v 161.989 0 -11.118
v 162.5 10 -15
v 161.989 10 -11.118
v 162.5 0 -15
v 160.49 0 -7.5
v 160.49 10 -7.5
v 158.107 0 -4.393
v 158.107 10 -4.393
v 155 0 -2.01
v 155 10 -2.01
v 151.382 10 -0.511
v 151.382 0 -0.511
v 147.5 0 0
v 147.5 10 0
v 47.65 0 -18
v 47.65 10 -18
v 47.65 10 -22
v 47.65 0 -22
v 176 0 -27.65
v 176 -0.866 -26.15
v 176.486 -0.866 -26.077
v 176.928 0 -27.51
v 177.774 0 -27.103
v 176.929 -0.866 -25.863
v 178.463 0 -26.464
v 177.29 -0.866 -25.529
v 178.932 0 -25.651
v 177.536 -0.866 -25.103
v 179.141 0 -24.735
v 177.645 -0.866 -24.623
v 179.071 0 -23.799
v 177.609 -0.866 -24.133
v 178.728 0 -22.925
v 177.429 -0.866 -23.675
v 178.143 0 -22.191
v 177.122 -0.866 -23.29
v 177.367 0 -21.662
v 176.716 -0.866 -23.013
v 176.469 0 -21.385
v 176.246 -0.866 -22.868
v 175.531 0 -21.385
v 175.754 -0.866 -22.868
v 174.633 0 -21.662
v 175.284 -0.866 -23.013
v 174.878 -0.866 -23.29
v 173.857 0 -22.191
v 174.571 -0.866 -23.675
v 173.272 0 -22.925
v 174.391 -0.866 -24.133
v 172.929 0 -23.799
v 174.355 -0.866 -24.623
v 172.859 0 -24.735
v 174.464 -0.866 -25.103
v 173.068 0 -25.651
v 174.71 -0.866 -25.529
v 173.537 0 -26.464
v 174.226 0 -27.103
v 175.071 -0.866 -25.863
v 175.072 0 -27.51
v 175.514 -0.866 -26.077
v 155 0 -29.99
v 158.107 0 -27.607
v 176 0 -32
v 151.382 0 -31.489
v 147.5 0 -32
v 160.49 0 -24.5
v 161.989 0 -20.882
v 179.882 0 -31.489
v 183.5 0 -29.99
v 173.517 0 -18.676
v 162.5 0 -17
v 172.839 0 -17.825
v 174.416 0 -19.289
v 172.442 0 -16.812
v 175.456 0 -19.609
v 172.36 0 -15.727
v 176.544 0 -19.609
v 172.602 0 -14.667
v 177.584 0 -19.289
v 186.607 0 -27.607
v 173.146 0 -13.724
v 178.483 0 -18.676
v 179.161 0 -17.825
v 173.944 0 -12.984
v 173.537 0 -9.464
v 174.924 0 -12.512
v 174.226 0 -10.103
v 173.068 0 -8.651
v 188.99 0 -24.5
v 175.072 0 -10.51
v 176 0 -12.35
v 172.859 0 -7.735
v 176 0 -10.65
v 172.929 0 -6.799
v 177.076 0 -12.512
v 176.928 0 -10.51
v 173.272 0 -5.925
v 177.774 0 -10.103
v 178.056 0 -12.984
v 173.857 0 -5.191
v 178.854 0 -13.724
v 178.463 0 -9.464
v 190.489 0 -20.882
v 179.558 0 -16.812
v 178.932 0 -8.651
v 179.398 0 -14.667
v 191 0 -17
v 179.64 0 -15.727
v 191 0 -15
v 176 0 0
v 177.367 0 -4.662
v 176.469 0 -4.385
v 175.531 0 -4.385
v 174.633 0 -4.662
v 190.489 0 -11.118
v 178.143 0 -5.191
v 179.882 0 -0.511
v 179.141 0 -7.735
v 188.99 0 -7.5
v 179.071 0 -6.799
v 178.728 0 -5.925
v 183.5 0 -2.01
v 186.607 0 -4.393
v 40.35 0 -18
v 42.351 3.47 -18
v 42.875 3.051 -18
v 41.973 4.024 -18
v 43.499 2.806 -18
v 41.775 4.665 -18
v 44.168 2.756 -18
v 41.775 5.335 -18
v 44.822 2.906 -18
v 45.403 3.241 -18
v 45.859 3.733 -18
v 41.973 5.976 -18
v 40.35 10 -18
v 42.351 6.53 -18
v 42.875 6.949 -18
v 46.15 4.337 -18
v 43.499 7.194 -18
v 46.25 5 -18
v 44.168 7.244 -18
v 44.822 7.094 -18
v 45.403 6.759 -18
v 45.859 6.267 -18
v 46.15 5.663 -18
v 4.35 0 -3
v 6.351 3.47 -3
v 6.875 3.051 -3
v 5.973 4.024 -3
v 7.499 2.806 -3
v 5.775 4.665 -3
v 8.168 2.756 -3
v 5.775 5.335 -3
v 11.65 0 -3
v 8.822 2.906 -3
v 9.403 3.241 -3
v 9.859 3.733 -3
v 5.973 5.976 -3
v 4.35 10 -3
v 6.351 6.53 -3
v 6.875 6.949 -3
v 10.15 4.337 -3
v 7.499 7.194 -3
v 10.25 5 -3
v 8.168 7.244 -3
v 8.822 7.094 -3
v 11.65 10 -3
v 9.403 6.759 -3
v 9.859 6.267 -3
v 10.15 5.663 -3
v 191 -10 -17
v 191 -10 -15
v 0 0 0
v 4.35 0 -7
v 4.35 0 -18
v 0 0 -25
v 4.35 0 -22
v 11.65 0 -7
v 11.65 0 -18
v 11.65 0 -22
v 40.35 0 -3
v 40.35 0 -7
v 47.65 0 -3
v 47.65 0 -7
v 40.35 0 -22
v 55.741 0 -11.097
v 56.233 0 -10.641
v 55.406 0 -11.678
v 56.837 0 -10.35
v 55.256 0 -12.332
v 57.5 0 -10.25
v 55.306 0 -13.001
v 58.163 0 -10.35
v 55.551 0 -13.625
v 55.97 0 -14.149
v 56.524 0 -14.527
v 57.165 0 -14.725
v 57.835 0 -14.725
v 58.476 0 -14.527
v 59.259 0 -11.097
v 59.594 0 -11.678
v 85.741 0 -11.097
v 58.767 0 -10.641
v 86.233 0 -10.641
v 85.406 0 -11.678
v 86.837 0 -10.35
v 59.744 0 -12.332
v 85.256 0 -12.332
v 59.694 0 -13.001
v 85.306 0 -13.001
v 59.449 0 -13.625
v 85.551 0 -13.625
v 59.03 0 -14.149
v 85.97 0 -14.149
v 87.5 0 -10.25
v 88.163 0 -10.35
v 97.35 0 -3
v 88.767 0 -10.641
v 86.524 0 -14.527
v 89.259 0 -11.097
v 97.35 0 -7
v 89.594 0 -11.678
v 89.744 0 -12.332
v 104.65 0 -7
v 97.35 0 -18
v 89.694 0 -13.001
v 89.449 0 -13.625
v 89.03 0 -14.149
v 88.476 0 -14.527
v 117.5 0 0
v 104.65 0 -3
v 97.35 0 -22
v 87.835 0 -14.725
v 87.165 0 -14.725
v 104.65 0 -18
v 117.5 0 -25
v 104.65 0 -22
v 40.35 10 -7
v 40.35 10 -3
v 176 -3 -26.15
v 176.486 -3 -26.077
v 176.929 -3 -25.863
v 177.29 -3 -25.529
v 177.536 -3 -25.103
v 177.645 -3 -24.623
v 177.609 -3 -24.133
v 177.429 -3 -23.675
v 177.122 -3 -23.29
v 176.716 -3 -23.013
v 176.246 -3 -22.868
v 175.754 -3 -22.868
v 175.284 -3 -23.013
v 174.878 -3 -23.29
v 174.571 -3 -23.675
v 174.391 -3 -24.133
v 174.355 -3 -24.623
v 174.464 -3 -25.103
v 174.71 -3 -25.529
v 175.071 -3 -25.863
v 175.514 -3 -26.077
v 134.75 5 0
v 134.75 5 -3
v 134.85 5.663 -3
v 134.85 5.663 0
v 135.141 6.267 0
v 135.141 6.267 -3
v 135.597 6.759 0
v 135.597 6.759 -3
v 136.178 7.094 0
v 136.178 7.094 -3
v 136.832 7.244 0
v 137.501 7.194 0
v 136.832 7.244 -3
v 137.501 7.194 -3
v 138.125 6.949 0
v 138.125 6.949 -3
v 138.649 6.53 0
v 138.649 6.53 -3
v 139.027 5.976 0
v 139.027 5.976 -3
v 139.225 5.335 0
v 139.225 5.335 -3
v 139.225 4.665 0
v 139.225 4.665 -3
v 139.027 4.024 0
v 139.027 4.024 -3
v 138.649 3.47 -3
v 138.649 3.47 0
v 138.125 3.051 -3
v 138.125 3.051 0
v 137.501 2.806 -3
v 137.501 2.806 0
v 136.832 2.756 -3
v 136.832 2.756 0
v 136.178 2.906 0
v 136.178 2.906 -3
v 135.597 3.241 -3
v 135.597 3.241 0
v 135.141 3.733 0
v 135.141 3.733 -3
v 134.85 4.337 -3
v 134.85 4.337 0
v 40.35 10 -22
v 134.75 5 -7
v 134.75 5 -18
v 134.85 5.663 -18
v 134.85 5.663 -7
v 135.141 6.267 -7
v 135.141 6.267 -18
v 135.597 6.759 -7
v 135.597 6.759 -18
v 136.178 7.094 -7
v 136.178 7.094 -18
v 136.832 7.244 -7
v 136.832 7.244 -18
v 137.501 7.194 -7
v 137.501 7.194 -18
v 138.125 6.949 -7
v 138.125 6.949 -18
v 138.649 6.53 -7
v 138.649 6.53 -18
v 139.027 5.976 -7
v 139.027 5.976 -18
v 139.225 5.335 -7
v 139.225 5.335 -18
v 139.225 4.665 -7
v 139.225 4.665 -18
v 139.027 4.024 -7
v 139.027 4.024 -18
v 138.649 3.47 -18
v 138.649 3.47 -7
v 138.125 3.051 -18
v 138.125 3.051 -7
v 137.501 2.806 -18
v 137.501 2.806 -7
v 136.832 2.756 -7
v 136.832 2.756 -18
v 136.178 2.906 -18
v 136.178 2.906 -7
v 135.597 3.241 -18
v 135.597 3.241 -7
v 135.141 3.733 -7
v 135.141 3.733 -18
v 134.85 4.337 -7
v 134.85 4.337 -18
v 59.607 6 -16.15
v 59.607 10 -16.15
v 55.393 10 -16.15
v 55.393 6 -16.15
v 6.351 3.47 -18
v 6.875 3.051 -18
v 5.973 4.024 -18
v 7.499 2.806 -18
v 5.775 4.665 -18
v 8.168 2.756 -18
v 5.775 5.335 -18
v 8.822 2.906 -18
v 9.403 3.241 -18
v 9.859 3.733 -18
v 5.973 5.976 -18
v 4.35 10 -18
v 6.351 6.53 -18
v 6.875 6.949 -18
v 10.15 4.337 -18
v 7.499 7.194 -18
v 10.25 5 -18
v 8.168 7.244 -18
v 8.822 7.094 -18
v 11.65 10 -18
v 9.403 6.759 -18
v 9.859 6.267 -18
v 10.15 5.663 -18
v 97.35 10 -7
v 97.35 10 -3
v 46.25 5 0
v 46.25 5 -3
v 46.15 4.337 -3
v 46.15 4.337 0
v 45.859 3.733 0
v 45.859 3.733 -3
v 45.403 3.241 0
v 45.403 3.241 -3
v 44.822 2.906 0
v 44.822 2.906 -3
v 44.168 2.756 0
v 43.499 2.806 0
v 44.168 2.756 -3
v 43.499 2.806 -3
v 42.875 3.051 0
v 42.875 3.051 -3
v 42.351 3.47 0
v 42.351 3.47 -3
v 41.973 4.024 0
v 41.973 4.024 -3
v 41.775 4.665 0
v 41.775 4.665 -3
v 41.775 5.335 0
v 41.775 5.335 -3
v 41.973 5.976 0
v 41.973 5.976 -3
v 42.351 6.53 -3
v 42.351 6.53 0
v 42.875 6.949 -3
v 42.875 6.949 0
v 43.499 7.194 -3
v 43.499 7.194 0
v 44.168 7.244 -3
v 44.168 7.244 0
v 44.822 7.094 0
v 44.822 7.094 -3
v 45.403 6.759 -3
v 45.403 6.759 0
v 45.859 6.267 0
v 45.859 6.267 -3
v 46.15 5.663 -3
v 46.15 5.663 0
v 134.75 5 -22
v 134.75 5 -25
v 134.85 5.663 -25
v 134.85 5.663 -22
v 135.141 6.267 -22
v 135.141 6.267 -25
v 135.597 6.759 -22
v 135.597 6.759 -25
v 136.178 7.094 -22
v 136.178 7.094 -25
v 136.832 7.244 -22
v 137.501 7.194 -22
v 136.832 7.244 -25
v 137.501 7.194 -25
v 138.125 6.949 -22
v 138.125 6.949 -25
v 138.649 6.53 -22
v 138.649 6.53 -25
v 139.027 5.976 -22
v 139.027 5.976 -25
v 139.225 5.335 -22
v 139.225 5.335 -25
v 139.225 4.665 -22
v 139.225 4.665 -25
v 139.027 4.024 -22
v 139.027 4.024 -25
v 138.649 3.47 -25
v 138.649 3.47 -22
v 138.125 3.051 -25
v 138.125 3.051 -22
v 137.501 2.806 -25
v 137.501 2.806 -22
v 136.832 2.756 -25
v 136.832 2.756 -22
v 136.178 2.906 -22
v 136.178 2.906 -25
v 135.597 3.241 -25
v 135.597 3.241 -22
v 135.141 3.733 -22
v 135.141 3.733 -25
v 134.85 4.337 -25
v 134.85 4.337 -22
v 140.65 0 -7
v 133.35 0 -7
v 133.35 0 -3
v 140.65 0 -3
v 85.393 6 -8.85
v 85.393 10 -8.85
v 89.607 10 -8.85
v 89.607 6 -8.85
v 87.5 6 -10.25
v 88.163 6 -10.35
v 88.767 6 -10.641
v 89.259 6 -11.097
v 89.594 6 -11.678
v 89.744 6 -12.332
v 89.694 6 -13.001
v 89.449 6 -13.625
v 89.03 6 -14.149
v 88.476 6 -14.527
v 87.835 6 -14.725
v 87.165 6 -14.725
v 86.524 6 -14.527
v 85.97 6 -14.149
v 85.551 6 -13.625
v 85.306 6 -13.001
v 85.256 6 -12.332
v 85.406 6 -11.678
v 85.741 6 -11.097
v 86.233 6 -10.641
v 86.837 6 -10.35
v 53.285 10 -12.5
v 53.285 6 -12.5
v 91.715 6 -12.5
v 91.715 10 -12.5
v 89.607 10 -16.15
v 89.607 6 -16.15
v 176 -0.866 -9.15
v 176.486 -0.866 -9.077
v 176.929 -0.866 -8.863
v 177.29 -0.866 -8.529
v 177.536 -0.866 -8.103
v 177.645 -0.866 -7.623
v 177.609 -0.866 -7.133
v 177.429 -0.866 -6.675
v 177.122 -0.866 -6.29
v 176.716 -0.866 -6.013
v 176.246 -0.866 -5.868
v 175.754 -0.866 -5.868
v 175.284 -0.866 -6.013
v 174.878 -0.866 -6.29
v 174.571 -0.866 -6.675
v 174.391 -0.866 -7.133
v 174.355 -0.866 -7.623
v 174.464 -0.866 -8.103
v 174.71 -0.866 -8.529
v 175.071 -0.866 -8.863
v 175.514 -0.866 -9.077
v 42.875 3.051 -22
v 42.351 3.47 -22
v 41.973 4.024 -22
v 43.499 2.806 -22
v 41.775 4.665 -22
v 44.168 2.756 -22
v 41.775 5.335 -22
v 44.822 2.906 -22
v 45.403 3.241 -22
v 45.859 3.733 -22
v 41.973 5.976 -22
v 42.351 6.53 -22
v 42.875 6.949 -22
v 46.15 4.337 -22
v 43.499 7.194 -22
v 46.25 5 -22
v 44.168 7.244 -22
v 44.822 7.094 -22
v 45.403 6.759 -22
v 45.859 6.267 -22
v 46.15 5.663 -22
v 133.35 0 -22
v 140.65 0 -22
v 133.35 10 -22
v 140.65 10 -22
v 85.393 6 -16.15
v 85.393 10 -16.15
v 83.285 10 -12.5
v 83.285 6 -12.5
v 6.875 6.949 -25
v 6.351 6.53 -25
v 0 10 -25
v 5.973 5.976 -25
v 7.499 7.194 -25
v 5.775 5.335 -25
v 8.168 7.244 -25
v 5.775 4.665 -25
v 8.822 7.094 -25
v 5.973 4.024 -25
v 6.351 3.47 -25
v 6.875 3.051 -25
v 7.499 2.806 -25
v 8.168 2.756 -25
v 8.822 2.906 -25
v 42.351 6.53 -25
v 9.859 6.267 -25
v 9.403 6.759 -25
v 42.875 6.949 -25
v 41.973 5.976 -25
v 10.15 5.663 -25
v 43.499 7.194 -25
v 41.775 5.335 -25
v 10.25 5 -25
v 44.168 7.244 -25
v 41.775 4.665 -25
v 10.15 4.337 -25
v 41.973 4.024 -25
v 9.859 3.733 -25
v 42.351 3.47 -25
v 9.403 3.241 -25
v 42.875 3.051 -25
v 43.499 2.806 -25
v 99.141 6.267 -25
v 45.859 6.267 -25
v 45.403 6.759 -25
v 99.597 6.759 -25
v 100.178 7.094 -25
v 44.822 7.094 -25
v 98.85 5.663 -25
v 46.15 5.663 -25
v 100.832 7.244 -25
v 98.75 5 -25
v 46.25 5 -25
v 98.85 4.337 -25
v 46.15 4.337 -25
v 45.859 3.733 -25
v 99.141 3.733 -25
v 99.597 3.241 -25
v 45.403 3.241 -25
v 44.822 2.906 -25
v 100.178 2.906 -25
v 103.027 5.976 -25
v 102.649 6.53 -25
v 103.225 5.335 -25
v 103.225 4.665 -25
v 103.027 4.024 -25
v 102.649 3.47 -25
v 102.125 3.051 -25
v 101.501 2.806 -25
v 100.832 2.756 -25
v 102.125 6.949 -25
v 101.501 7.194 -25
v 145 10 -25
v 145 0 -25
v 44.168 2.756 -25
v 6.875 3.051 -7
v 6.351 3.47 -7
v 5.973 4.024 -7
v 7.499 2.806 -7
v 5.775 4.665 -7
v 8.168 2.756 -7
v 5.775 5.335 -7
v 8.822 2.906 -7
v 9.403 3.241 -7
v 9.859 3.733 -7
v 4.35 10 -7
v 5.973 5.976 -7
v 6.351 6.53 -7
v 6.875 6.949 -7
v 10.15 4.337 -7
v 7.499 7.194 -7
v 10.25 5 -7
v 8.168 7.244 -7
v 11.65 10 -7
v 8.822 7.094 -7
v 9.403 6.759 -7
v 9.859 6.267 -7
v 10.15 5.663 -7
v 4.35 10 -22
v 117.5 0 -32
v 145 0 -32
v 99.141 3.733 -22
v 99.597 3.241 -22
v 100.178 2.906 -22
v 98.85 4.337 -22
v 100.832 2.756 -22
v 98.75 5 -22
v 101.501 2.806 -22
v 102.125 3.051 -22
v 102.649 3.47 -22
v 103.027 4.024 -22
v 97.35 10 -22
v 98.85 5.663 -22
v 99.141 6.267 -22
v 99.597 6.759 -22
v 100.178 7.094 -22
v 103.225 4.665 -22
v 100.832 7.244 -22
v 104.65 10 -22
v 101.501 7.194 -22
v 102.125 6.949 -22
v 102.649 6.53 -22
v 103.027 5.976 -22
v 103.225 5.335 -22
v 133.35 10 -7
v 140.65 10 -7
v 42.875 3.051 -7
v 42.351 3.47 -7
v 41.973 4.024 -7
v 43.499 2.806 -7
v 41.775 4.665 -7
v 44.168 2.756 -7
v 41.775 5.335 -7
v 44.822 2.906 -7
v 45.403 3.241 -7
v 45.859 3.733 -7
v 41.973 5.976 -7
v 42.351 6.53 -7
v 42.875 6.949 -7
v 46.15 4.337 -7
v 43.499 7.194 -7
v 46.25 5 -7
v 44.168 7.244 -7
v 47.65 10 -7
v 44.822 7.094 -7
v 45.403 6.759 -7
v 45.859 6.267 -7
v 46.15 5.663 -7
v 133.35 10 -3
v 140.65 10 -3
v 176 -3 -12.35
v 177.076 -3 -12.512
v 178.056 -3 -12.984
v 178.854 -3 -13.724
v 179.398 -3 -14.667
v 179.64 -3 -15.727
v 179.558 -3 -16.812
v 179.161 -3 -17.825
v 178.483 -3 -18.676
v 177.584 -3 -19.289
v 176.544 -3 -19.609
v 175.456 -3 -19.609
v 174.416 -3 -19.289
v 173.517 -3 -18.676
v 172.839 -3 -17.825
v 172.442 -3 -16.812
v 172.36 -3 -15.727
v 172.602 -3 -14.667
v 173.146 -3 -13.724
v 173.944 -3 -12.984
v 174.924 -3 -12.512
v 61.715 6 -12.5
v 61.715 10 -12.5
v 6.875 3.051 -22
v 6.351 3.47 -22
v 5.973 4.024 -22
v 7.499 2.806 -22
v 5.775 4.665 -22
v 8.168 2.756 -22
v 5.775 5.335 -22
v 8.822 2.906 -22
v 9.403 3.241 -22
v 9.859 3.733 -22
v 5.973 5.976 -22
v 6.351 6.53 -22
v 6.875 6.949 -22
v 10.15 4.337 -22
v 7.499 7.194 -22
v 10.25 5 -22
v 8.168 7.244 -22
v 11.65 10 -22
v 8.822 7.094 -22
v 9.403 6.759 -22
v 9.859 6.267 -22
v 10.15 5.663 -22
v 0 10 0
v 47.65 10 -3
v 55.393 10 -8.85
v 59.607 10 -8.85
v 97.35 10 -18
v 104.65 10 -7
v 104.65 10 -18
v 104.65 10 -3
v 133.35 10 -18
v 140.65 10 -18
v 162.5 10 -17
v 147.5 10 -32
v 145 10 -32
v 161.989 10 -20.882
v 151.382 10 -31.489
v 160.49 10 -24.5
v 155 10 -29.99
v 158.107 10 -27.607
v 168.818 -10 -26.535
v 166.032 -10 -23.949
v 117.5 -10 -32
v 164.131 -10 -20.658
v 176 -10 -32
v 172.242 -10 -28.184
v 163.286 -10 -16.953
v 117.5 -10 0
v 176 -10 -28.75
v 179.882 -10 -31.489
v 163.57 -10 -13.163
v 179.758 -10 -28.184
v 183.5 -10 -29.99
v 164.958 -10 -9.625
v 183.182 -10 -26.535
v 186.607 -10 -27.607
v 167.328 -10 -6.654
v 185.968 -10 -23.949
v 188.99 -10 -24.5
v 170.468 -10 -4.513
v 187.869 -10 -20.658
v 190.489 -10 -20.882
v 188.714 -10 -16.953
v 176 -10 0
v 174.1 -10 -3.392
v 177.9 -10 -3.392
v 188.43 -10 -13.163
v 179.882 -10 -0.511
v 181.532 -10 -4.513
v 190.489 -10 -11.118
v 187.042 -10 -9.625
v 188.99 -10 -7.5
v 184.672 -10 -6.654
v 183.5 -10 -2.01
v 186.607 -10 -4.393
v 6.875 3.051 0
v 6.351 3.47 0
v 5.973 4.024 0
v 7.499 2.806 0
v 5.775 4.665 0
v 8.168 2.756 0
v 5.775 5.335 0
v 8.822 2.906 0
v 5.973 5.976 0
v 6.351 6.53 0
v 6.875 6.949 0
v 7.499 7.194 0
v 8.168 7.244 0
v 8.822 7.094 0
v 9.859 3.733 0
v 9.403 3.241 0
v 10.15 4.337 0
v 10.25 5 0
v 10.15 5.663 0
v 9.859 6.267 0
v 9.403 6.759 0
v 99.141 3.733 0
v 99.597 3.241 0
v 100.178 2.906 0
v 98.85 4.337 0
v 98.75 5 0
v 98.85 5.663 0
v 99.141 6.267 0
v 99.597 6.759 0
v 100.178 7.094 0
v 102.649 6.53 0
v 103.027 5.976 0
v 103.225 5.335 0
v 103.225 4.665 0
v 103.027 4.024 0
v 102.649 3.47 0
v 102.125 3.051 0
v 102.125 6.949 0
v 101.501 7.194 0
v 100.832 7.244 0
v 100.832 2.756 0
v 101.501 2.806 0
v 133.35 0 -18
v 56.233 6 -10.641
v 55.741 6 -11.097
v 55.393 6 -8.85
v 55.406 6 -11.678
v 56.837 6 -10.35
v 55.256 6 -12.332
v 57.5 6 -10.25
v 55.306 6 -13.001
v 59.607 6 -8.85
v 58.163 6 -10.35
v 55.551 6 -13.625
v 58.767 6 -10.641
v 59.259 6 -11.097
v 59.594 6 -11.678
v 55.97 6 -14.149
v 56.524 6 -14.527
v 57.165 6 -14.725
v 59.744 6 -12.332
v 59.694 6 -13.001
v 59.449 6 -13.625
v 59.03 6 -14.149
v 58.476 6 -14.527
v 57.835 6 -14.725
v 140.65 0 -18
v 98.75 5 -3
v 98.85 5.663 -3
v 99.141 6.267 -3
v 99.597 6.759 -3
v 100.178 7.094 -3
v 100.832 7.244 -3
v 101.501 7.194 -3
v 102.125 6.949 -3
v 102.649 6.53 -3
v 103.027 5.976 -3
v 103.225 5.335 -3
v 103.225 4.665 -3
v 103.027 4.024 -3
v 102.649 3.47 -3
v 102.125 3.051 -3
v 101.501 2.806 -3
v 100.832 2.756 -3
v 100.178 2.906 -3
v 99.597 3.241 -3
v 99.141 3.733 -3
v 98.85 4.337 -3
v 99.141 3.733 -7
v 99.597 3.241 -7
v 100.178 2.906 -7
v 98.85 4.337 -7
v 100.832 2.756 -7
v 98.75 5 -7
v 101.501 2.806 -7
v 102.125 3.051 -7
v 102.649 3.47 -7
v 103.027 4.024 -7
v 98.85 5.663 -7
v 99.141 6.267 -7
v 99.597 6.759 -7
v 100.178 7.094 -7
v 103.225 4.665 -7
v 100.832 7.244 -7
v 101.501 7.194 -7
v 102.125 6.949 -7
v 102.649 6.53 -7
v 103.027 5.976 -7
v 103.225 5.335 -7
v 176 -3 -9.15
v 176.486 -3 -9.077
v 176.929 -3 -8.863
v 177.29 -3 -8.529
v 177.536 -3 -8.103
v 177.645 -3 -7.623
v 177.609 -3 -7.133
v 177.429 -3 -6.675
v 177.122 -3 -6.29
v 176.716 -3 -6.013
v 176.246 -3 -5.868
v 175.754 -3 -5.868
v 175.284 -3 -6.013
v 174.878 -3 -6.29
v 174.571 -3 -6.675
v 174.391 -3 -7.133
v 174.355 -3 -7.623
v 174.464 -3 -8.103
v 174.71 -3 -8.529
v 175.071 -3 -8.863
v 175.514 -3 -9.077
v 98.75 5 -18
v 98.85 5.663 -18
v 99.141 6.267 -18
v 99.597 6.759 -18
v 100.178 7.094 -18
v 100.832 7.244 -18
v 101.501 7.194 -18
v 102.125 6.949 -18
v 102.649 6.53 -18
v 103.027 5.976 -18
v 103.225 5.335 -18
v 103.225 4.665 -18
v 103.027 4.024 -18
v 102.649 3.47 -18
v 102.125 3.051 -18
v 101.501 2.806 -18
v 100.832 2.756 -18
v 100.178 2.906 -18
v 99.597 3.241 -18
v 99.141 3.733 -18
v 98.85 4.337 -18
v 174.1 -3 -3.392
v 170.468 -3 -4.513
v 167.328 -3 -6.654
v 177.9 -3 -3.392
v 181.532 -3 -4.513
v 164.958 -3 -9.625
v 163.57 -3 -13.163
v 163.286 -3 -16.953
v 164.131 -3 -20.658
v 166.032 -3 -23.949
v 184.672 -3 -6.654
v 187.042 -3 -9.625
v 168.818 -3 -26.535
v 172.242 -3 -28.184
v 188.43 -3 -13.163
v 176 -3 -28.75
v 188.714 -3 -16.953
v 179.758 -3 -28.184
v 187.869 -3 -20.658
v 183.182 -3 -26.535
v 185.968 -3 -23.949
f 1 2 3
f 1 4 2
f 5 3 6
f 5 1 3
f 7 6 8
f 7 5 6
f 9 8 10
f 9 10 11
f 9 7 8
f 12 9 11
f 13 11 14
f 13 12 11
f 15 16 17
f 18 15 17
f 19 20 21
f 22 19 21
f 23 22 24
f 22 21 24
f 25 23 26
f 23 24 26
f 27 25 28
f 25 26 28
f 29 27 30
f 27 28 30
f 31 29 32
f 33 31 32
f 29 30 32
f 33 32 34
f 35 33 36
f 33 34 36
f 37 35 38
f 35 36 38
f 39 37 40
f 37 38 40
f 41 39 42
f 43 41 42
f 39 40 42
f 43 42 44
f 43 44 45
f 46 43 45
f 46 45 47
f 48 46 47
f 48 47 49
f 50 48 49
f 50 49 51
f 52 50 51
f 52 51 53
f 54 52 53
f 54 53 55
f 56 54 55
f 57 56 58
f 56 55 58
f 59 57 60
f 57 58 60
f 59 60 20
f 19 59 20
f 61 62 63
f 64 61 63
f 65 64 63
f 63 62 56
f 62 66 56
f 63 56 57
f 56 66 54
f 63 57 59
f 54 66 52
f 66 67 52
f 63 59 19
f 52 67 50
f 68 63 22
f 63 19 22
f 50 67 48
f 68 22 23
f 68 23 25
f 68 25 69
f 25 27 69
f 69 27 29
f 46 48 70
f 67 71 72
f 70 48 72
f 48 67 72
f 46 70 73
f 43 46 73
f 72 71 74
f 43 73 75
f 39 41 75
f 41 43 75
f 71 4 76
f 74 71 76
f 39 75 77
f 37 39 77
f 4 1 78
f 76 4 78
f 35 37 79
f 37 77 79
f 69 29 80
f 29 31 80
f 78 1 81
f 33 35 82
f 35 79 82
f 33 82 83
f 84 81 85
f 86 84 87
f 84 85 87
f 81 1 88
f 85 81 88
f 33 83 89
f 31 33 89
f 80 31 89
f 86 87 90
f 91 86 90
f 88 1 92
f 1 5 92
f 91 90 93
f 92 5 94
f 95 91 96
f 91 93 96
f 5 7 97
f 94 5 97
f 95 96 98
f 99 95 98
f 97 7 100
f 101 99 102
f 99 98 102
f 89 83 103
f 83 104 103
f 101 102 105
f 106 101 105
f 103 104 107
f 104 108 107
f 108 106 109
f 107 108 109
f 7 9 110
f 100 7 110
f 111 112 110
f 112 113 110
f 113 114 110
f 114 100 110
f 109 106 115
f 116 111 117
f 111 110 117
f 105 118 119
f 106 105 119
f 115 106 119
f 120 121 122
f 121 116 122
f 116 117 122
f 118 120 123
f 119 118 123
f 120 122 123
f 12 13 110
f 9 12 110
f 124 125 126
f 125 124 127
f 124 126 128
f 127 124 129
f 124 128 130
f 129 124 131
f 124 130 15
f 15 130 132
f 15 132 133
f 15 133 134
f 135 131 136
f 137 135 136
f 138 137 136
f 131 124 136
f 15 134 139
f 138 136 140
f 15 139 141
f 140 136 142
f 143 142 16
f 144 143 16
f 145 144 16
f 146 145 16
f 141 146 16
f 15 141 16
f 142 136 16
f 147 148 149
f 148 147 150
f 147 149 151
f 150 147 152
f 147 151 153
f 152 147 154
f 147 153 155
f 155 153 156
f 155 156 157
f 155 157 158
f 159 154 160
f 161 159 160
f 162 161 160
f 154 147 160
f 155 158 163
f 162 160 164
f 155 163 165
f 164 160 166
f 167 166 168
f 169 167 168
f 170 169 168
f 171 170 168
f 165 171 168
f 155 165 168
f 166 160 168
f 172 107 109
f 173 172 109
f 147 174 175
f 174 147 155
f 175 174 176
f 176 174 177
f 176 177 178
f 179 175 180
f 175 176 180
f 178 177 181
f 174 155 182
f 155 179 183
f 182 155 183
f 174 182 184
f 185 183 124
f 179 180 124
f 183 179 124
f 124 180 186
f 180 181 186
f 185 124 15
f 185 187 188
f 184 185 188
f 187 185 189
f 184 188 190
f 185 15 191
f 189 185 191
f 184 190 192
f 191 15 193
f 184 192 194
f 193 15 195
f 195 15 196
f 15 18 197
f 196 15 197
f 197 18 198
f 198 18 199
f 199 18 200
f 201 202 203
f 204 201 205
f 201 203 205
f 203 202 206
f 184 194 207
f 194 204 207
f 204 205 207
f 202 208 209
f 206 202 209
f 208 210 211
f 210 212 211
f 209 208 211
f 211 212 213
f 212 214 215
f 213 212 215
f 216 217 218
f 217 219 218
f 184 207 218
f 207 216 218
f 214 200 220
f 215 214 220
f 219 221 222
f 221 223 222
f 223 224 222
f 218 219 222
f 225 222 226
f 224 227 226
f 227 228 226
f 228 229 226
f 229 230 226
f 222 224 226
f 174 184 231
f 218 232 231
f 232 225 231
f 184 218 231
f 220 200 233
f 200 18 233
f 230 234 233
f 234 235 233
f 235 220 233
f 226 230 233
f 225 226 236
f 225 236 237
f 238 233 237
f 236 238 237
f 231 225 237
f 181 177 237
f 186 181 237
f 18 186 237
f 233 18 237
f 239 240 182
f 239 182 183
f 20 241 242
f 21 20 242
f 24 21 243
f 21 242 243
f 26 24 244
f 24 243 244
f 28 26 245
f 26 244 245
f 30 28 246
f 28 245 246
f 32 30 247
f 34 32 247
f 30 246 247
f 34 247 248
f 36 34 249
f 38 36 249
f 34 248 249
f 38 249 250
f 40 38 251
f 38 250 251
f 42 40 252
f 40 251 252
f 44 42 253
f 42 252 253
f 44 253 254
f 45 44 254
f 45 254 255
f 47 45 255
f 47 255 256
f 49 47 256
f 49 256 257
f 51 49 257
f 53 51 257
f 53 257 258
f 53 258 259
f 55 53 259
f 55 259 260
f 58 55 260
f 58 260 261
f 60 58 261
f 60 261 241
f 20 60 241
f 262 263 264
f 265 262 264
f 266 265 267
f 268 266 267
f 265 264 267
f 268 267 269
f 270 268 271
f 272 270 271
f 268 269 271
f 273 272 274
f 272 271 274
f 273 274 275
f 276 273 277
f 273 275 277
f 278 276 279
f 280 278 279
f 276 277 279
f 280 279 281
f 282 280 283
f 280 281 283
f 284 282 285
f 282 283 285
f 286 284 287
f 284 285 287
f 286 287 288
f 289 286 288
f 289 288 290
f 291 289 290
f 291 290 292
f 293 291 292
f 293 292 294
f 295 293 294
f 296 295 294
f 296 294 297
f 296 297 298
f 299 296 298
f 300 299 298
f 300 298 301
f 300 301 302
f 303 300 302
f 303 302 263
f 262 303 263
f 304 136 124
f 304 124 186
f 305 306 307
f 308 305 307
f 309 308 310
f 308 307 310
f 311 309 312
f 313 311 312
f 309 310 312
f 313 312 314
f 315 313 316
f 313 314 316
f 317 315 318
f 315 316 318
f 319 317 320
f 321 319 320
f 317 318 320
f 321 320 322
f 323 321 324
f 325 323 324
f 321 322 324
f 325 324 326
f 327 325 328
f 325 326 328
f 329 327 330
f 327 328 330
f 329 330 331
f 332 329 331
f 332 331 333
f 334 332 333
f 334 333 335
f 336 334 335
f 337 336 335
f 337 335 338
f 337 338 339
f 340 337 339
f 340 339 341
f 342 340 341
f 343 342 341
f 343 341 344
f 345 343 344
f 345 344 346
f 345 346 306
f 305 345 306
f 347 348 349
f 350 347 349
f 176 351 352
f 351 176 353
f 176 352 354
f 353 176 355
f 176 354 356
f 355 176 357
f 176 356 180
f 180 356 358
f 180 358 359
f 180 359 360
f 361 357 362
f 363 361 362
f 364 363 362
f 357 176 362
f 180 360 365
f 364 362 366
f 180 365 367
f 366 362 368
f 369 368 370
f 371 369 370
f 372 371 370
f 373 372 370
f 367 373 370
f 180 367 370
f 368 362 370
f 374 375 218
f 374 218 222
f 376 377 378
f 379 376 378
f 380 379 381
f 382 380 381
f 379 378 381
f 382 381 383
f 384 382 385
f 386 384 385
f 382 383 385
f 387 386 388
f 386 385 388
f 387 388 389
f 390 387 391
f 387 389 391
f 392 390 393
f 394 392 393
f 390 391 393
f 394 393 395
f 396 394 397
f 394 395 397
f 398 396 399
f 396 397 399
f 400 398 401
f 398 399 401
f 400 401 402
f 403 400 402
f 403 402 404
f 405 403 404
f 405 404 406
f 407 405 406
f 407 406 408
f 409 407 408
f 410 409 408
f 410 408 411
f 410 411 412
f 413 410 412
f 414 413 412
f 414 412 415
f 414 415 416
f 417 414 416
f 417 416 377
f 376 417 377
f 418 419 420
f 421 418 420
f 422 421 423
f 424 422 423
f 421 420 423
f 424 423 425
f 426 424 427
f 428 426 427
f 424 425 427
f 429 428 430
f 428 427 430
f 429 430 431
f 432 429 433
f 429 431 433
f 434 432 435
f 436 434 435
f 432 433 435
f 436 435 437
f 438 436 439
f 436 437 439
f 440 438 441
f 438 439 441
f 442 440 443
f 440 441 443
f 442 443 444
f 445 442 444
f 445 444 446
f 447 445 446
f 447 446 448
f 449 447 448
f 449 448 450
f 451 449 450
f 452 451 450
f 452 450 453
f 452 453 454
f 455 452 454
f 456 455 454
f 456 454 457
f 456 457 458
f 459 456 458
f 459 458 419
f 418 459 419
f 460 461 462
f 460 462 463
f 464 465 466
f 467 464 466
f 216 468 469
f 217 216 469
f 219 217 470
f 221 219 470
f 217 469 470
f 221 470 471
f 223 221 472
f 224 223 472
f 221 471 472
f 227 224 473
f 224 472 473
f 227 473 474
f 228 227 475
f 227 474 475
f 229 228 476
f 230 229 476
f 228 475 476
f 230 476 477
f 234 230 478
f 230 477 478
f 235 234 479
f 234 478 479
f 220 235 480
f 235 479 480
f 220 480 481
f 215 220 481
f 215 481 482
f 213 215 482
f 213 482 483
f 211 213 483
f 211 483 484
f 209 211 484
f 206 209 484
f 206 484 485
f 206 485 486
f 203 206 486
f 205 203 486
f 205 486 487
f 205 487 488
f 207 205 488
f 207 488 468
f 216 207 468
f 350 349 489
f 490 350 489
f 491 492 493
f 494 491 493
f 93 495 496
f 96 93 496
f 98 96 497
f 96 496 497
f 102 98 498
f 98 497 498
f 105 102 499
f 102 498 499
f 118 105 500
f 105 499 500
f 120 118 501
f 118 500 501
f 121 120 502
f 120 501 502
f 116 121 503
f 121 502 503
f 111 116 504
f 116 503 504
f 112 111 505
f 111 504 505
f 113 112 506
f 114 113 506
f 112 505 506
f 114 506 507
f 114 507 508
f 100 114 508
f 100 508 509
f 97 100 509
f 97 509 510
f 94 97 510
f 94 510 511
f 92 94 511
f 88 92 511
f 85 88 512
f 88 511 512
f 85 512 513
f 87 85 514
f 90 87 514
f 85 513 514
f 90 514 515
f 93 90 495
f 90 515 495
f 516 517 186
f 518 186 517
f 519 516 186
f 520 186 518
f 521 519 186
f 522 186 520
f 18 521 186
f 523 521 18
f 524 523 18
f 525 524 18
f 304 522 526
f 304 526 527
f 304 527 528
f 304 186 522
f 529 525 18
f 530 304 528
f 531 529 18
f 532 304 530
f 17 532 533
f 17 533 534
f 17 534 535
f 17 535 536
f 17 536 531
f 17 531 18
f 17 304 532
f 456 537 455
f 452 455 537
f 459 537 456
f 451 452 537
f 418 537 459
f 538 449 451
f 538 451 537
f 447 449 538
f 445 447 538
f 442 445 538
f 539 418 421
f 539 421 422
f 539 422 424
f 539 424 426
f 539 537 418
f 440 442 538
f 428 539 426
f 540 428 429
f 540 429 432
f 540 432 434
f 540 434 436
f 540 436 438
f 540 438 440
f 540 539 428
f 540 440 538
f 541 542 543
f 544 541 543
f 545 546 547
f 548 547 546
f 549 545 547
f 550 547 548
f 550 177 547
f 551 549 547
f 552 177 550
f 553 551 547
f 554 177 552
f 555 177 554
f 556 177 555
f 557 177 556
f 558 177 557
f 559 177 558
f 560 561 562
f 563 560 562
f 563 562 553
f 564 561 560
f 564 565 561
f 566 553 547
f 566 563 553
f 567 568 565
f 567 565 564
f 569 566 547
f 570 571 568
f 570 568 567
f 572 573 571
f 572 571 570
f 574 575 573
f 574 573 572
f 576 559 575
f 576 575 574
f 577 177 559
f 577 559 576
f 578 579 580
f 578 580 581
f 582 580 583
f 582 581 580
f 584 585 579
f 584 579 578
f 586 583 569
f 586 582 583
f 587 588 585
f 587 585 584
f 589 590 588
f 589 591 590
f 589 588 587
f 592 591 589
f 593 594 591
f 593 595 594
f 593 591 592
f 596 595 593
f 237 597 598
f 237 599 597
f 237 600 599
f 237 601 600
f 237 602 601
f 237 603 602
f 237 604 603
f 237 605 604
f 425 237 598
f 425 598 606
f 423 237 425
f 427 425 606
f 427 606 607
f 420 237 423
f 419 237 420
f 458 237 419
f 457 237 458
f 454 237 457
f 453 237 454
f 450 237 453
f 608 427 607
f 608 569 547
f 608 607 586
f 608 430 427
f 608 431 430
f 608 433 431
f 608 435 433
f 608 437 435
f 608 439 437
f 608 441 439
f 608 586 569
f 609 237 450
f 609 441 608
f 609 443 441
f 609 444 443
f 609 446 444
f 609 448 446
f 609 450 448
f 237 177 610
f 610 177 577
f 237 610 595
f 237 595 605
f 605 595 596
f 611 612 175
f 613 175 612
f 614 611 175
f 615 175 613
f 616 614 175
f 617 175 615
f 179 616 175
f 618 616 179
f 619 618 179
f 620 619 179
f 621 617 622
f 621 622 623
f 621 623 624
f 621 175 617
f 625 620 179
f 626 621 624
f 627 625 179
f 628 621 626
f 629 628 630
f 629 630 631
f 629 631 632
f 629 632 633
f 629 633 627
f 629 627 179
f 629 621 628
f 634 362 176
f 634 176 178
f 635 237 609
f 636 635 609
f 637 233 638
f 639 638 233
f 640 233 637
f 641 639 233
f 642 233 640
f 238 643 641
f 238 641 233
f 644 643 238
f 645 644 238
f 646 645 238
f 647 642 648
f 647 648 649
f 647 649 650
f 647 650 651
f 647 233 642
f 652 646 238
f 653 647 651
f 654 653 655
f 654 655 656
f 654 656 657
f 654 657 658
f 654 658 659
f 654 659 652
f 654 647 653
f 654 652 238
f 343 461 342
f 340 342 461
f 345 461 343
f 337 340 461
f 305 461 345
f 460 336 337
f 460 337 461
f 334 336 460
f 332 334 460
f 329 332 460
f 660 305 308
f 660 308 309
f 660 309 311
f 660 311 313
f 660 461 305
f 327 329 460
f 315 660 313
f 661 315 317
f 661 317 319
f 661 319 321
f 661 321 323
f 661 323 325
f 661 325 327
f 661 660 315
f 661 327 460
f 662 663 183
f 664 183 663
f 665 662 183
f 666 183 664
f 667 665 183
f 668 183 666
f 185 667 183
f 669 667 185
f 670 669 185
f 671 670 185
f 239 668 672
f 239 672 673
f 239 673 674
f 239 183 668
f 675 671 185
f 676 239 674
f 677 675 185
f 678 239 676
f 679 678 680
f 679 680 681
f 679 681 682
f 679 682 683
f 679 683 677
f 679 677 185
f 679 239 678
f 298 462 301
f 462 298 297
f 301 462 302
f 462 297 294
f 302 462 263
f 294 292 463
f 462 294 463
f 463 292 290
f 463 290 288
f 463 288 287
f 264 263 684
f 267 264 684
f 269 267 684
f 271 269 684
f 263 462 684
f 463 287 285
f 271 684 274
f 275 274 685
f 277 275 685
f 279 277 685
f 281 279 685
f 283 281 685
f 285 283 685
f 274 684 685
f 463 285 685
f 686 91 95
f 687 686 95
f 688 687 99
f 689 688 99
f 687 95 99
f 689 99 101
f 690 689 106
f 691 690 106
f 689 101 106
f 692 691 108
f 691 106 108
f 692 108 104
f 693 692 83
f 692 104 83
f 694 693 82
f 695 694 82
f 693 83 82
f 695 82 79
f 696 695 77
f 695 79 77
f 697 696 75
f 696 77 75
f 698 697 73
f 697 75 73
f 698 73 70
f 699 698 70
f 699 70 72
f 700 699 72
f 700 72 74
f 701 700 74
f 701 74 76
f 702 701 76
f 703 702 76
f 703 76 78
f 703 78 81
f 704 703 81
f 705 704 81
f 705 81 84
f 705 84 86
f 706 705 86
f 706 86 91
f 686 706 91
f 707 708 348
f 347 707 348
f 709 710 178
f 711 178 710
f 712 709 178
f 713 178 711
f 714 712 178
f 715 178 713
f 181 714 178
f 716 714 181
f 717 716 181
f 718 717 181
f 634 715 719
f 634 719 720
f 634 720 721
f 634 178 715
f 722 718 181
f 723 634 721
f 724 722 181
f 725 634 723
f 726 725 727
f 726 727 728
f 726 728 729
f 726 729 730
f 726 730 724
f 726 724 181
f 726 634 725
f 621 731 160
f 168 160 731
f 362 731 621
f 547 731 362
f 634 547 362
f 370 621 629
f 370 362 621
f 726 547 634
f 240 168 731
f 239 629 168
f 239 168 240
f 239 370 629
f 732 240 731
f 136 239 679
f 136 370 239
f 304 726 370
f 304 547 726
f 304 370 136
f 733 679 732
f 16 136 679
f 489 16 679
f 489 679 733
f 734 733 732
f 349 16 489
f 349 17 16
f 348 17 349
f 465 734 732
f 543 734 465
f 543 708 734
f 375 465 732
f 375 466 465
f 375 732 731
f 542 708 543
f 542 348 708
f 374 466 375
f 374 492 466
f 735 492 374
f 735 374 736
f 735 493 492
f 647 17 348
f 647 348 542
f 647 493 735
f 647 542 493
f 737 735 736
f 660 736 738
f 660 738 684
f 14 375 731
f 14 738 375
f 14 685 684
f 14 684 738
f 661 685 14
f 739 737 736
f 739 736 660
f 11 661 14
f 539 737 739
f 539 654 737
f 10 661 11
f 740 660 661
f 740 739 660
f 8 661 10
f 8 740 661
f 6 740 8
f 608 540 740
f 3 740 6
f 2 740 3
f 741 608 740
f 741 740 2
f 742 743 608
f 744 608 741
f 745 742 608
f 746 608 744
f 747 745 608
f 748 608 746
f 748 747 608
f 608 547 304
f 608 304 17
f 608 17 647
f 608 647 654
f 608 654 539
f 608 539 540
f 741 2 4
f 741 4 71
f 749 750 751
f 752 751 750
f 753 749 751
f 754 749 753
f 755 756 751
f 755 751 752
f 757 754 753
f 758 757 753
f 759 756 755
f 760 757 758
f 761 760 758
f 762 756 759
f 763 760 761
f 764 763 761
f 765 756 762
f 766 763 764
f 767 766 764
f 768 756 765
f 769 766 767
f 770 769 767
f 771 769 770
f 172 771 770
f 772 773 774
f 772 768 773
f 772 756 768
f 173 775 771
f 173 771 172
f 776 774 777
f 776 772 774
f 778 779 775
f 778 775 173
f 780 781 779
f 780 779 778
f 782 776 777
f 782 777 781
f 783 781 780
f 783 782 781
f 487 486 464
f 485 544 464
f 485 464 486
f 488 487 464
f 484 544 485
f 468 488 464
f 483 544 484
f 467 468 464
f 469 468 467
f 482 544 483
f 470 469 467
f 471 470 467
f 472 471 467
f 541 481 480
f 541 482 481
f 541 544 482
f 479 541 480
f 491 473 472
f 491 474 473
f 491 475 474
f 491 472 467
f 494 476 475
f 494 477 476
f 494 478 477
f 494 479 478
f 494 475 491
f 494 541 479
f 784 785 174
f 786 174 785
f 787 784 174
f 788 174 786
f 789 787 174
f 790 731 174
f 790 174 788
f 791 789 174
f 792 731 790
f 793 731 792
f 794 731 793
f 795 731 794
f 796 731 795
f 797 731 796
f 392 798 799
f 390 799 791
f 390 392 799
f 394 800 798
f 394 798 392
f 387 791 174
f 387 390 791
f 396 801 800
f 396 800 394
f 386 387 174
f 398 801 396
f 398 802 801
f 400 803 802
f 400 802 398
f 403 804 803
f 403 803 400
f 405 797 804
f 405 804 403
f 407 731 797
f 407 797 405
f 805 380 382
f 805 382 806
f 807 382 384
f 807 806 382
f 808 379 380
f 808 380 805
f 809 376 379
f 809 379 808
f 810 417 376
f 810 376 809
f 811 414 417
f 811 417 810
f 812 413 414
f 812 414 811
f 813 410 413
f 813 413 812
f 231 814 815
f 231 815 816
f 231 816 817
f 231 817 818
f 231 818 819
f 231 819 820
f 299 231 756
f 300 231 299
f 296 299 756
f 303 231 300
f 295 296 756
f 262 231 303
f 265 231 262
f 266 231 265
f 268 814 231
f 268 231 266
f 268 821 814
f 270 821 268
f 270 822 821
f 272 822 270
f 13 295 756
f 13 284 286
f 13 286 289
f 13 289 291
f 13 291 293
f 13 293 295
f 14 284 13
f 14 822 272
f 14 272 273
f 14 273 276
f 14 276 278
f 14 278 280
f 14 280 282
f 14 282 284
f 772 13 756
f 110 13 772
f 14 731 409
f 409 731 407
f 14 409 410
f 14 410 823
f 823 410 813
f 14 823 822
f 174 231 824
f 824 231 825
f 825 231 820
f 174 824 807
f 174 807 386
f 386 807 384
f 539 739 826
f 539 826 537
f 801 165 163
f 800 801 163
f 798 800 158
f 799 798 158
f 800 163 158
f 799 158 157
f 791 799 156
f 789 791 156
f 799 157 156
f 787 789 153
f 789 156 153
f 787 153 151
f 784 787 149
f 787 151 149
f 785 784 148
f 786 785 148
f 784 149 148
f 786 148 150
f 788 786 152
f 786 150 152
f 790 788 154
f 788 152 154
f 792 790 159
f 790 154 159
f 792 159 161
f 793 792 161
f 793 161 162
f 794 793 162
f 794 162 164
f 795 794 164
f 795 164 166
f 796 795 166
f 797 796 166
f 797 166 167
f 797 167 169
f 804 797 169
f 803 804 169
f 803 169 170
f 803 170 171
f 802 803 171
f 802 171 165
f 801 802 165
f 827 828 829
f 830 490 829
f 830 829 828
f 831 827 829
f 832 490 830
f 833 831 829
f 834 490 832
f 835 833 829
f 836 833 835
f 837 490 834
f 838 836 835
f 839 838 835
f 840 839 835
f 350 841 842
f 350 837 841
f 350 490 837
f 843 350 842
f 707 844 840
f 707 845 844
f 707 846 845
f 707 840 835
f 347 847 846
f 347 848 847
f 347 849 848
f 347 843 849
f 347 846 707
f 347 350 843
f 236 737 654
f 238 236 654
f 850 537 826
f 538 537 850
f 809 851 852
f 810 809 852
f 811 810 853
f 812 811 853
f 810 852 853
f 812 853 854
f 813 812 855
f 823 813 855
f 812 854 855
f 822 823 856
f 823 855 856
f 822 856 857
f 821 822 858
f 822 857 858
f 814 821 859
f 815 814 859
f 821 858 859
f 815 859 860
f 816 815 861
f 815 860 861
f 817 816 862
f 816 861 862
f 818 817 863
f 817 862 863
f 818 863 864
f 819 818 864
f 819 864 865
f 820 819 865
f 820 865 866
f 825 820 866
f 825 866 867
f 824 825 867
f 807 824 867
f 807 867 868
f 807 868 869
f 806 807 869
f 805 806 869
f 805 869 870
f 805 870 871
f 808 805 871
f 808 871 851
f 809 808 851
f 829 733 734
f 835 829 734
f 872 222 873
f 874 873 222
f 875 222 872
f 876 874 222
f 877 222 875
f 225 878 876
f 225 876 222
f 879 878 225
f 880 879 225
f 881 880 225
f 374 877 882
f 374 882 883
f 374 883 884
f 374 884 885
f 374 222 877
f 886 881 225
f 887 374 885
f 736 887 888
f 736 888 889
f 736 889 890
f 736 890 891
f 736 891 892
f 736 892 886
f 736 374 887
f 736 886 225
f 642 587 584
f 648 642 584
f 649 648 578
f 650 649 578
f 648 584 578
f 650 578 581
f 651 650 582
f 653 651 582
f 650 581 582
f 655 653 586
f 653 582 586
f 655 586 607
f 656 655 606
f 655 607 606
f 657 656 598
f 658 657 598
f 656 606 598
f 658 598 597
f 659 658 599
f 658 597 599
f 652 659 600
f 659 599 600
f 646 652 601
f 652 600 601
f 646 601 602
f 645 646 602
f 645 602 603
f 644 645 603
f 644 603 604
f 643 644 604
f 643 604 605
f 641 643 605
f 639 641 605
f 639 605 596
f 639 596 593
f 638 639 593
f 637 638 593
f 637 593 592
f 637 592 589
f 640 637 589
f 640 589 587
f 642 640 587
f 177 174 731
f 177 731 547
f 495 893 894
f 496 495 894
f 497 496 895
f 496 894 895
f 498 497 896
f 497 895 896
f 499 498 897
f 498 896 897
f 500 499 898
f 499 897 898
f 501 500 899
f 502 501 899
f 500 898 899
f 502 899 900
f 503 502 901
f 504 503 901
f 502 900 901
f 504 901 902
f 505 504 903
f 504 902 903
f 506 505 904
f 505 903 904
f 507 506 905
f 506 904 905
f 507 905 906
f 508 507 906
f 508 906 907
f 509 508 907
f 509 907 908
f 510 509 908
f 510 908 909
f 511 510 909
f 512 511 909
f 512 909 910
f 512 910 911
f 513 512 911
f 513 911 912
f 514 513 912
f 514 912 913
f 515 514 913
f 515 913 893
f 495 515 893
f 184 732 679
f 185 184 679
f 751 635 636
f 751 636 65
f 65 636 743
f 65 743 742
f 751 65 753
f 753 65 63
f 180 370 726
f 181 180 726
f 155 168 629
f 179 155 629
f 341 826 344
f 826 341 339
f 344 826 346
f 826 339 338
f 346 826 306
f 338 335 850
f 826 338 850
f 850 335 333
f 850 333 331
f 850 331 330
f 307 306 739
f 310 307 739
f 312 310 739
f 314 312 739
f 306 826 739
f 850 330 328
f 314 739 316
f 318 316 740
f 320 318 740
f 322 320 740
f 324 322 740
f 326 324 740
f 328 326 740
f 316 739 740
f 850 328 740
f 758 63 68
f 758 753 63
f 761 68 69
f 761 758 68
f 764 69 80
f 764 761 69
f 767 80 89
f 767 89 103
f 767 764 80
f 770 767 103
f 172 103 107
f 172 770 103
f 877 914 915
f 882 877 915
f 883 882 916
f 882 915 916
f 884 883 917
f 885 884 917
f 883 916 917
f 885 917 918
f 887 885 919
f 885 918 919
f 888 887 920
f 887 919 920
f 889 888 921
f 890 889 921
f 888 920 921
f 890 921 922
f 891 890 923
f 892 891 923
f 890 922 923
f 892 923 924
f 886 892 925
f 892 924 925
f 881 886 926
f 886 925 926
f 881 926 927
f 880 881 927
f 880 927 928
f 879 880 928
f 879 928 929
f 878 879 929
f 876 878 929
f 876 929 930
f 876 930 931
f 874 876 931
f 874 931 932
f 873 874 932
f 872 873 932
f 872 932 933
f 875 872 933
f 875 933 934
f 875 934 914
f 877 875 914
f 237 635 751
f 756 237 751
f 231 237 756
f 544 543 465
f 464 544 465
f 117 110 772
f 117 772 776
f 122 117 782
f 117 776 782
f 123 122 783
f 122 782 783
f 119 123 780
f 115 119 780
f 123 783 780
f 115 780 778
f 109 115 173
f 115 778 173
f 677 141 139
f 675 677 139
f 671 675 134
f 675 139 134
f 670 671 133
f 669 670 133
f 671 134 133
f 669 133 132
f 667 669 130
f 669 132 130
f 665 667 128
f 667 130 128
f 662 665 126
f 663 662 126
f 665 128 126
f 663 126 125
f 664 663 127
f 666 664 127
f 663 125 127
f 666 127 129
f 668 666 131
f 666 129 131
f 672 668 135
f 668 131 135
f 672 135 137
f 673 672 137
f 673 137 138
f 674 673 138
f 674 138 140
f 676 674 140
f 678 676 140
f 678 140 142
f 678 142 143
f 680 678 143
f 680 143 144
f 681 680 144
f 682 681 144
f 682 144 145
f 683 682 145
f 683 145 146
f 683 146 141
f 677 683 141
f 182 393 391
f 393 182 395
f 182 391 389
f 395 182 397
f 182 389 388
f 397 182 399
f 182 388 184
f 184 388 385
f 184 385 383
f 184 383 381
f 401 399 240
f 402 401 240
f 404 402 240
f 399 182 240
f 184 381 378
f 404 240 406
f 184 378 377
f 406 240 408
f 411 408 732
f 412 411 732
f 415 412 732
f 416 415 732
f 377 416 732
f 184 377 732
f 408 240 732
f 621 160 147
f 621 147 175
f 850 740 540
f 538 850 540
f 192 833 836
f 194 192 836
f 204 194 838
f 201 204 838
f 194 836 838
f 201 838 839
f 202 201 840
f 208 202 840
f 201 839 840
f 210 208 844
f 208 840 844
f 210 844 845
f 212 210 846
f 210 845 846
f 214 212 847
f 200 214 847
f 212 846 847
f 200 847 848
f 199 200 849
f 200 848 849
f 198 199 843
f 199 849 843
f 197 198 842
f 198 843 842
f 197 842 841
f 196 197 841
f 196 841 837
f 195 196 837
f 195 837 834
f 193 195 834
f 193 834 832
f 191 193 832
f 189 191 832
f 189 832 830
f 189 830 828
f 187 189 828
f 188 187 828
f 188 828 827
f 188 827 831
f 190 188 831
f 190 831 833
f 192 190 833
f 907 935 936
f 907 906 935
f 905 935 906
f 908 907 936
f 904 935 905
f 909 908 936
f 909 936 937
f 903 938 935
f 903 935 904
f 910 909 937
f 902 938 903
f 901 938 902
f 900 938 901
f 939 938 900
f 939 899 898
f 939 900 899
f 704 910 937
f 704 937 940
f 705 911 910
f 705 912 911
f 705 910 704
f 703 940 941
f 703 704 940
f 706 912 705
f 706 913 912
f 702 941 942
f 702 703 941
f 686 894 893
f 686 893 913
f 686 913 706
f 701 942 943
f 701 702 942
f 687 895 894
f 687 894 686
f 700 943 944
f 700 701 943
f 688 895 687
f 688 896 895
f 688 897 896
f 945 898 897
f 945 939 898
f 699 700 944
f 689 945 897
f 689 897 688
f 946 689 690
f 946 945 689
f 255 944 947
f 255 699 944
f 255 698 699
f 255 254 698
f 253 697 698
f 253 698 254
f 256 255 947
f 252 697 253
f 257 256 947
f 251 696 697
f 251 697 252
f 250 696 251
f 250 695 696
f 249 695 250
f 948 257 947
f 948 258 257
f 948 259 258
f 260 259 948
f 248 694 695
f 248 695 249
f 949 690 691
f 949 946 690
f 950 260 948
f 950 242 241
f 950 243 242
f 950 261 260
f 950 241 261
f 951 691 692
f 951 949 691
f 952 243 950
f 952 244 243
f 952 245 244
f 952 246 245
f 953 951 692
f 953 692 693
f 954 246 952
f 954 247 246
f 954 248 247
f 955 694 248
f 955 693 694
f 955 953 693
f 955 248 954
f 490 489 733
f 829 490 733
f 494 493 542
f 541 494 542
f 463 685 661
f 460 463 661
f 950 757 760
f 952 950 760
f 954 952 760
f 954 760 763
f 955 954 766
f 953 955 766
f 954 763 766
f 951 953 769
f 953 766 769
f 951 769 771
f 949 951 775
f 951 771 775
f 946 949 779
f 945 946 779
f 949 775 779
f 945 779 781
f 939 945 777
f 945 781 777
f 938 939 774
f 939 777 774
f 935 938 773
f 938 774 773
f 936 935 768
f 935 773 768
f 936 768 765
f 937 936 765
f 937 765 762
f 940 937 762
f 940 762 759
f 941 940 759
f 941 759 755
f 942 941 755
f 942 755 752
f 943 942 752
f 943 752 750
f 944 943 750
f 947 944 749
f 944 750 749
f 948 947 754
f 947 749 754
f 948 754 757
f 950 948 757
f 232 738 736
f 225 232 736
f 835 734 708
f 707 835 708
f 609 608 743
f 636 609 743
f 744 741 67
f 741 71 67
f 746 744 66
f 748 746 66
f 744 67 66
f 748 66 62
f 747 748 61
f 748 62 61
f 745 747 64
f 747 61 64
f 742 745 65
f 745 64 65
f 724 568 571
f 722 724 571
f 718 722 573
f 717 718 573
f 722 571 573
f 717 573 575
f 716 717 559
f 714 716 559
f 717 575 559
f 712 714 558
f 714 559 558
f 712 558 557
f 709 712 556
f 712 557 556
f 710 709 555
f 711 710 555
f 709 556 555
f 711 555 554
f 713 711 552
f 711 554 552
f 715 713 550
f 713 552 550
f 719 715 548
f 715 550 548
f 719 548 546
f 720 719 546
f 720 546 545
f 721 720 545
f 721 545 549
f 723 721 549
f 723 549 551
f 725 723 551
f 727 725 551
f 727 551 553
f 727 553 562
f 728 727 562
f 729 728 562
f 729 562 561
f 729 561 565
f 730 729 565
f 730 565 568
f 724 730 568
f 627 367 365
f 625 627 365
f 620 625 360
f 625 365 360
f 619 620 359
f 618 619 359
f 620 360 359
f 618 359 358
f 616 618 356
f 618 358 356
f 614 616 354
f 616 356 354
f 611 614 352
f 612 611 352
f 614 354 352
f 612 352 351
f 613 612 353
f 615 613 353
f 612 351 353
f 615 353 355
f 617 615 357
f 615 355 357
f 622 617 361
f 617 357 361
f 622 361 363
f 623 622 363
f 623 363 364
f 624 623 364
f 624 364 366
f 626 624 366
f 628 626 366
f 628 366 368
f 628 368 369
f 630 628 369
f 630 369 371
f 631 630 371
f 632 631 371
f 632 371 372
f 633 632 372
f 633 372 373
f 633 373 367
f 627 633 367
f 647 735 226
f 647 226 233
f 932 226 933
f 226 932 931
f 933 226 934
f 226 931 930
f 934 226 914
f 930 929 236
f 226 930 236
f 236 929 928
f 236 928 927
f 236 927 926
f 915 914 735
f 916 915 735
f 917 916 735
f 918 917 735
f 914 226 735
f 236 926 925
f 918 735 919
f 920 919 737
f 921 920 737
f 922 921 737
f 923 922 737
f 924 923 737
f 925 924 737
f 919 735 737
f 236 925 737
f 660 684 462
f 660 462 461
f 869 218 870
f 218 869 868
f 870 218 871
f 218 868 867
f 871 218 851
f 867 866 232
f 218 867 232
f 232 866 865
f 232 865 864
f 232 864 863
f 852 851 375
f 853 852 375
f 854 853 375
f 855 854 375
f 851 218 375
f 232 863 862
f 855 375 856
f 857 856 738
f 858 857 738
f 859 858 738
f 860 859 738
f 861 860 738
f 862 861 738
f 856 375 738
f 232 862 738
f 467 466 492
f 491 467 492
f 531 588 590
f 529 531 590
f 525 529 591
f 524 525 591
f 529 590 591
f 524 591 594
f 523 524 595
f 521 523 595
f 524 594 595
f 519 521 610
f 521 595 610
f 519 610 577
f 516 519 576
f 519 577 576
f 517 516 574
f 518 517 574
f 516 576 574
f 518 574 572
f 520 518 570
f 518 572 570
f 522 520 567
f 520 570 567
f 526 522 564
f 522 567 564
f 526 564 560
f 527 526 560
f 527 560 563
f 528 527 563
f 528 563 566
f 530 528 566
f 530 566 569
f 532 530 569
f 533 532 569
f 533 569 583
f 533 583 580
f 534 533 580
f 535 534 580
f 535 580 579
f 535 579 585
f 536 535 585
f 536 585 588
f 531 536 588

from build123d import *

# Parameters (mm, degrees)
SKETCH1_W           = 145
SKETCH1_H           = 25
BOSS_EXTRUDE1_DEPTH = 10
SKETCH2_W           = 17.5
SKETCH2_H           = 32
BOSS_EXTRUDE2_DEPTH = 10
SKETCH4_W           = 73.5
SKETCH4_H           = 32
BOSS_EXTRUDE3_DEPTH = 10
SKETCH8_R           = 2.25
CUT_EXTRUDE5_DEPTH  = 193.888568868
SKETCH9_W           = 7.3
SKETCH9_H           = 4
CUT_EXTRUDE6_DEPTH  = 10
CUT_EXTRUDE7_REACH  = 195.92
SKETCH10_R          = 3.65
SKETCH11_R          = 12.75
CUT_EXTRUDE8_DEPTH  = 7
CUT_EXTRUDE11_REACH = 196.098
SKETCH14_R          = 1.65
CHAMFER1_SIZE       = 1.5
CHAMFER1_SIZE2      = 0.866025404
FILLET1_R           = 15
SKETCH15_R          = 2.25
CUT_EXTRUDE12_DEPTH = 195.692064553
CUT_EXTRUDE13_DEPTH = 4


with BuildPart() as part:
    # Sketch1 → Boss-Extrude1 (new body)
    with BuildSketch(Plane(origin=(0, 0, 0), x_dir=(1, 0, 0), z_dir=(0, 1, 0))):
        with Locations((72.5, 12.5)):
            Rectangle(SKETCH1_W, SKETCH1_H)
    extrude(amount=BOSS_EXTRUDE1_DEPTH)

    # Sketch2 → Boss-Extrude2 (add)
    with BuildSketch(Plane(origin=(0, 10, 0), x_dir=(1, 0, 0), z_dir=(0, 1, 0))):
        with Locations((153.75, 16)):
            Rectangle(SKETCH2_W, SKETCH2_H)
    extrude(amount=-BOSS_EXTRUDE2_DEPTH)

    # Sketch4 → Boss-Extrude3 (add)
    with BuildSketch(Plane.XZ):
        with Locations((154.25, -16)):
            Rectangle(SKETCH4_W, SKETCH4_H)
    extrude(amount=BOSS_EXTRUDE3_DEPTH)

    # Sketch8 → Cut-Extrude5 (cut, through all)
    with BuildSketch(Plane(origin=(0, 0, -25), x_dir=(-1, 0, 0), z_dir=(0, 0, -1))):
        with Locations((-137, 5)):
            Circle(SKETCH8_R)
        with Locations((-101, 5)):
            Circle(SKETCH8_R)
        with Locations(Location((-44, 5, 0), (0, 0, 180))):
            Circle(SKETCH8_R)
        with Locations(Location((-8, 5, 0), (0, 0, 180))):
            Circle(SKETCH8_R)
    extrude(amount=-CUT_EXTRUDE5_DEPTH, mode=Mode.SUBTRACT)

    # Sketch9 → Cut-Extrude6 (cut)
    with BuildSketch(Plane(origin=(0, 10, 0), x_dir=(1, 0, 0), z_dir=(0, 1, 0))):
        with Locations((137, 20)):
            Rectangle(SKETCH9_W, SKETCH9_H)
        with Locations((137, 5)):
            Rectangle(SKETCH9_W, SKETCH9_H)
        with Locations((101, 5)):
            Rectangle(SKETCH9_W, SKETCH9_H)
        with Locations((101, 20)):
            Rectangle(SKETCH9_W, SKETCH9_H)
        with Locations((8, 20)):
            Rectangle(SKETCH9_W, SKETCH9_H)
        with Locations((44, 20)):
            Rectangle(SKETCH9_W, SKETCH9_H)
        with Locations((44, 5)):
            Rectangle(SKETCH9_W, SKETCH9_H)
        with Locations((8, 5)):
            Rectangle(SKETCH9_W, SKETCH9_H)
    extrude(amount=-CUT_EXTRUDE6_DEPTH, mode=Mode.SUBTRACT)

    # Sketch10 → Cut-Extrude7 (cut, up to next)
    with BuildSketch(Plane(origin=(0, 0, 0), x_dir=(1, 0, 0), z_dir=(0, 1, 0)), mode=Mode.PRIVATE) as cut_extrude7_sk1:
        with Locations(Location((176, 16, 0), (0, 0, 270))):
            Circle(SKETCH10_R)
    cut_extrude7_tool1 = extrude(cut_extrude7_sk1.sketch, amount=-CUT_EXTRUDE7_REACH, mode=Mode.PRIVATE) & part.part
    add(cut_extrude7_tool1.solids().sort_by_distance((176, 0, -16))[0], mode=Mode.SUBTRACT)

    # Sketch11 → Cut-Extrude8 (cut)
    with BuildSketch(Plane.XZ.offset(10)):
        with Locations(Location((176, -16, 0), (0, 0, 270))):
            Circle(SKETCH11_R)
    extrude(amount=-CUT_EXTRUDE8_DEPTH, mode=Mode.SUBTRACT)

    # Sketch14 → Cut-Extrude11 (cut, up to next)
    with BuildSketch(Plane.XZ.offset(3), mode=Mode.PRIVATE) as cut_extrude11_sk1:
        with Locations(Location((176, -7.5, 0), (0, 0, 270))):
            Circle(SKETCH14_R)
    cut_extrude11_tool1 = extrude(cut_extrude11_sk1.sketch, amount=-CUT_EXTRUDE11_REACH, mode=Mode.PRIVATE) & part.part
    # Sketch14 → Cut-Extrude11 (cut, up to next)
    with BuildSketch(Plane.XZ.offset(3), mode=Mode.PRIVATE) as cut_extrude11_sk2:
        with Locations(Location((176, -24.5, 0), (0, 0, 270))):
            Circle(SKETCH14_R)
    cut_extrude11_tool2 = extrude(cut_extrude11_sk2.sketch, amount=-CUT_EXTRUDE11_REACH, mode=Mode.PRIVATE) & part.part
    add(cut_extrude11_tool1.solids().sort_by_distance((176, -3, -7.5))[0], mode=Mode.SUBTRACT)
    add(cut_extrude11_tool2.solids().sort_by_distance((176, -3, -24.5))[0], mode=Mode.SUBTRACT)

    # Chamfer1
    chamfer1_edges = [part.edges().sort_by_distance(p)[0] for p in [
        (176, 0, -5.85),
        (176, 0, -22.85),
    ]]
    chamfer1_side = [part.faces().sort_by_distance(p)[0] for p in [
        (162.928514877, 0, -16),
    ]]
    chamfer(chamfer1_edges, length=CHAMFER1_SIZE, length2=CHAMFER1_SIZE2, reference=chamfer1_side[0])

    # Fillet1
    fillet1_edges = [part.edges().sort_by_distance(p)[0] for p in [
        (162.5, 5, -32),
        (162.5, 5, 0),
        (191, -5, -32),
        (191, -5, 0),
    ]]
    fillet(fillet1_edges, radius=FILLET1_R)

    # Sketch15 → Cut-Extrude12 (cut, through all)
    with BuildSketch(Plane(origin=(0, 10, 0), x_dir=(1, 0, 0), z_dir=(0, 1, 0))):
        with Locations(Location((57.5, 12.5, 0), (0, 0, 270))):
            Circle(SKETCH15_R)
        with Locations(Location((87.5, 12.5, 0), (0, 0, 270))):
            Circle(SKETCH15_R)
    extrude(amount=-CUT_EXTRUDE12_DEPTH, mode=Mode.SUBTRACT)

    # Sketch16 → Cut-Extrude13 (cut)
    with BuildSketch(Plane(origin=(0, 10, 0), x_dir=(1, 0, 0), z_dir=(0, 1, 0))):
        Polygon((91.714656965, 12.5), (89.607328483, 16.15), (85.392671517, 16.15), (83.285343035, 12.5), (85.392671517, 8.85), (89.607328483, 8.85), align=None)
        Polygon((61.714656965, 12.5), (59.607328483, 16.15), (55.392671517, 16.15), (53.285343035, 12.5), (55.392671517, 8.85), (59.607328483, 8.85), align=None)
    extrude(amount=-CUT_EXTRUDE13_DEPTH, mode=Mode.SUBTRACT)


solid = part.part
